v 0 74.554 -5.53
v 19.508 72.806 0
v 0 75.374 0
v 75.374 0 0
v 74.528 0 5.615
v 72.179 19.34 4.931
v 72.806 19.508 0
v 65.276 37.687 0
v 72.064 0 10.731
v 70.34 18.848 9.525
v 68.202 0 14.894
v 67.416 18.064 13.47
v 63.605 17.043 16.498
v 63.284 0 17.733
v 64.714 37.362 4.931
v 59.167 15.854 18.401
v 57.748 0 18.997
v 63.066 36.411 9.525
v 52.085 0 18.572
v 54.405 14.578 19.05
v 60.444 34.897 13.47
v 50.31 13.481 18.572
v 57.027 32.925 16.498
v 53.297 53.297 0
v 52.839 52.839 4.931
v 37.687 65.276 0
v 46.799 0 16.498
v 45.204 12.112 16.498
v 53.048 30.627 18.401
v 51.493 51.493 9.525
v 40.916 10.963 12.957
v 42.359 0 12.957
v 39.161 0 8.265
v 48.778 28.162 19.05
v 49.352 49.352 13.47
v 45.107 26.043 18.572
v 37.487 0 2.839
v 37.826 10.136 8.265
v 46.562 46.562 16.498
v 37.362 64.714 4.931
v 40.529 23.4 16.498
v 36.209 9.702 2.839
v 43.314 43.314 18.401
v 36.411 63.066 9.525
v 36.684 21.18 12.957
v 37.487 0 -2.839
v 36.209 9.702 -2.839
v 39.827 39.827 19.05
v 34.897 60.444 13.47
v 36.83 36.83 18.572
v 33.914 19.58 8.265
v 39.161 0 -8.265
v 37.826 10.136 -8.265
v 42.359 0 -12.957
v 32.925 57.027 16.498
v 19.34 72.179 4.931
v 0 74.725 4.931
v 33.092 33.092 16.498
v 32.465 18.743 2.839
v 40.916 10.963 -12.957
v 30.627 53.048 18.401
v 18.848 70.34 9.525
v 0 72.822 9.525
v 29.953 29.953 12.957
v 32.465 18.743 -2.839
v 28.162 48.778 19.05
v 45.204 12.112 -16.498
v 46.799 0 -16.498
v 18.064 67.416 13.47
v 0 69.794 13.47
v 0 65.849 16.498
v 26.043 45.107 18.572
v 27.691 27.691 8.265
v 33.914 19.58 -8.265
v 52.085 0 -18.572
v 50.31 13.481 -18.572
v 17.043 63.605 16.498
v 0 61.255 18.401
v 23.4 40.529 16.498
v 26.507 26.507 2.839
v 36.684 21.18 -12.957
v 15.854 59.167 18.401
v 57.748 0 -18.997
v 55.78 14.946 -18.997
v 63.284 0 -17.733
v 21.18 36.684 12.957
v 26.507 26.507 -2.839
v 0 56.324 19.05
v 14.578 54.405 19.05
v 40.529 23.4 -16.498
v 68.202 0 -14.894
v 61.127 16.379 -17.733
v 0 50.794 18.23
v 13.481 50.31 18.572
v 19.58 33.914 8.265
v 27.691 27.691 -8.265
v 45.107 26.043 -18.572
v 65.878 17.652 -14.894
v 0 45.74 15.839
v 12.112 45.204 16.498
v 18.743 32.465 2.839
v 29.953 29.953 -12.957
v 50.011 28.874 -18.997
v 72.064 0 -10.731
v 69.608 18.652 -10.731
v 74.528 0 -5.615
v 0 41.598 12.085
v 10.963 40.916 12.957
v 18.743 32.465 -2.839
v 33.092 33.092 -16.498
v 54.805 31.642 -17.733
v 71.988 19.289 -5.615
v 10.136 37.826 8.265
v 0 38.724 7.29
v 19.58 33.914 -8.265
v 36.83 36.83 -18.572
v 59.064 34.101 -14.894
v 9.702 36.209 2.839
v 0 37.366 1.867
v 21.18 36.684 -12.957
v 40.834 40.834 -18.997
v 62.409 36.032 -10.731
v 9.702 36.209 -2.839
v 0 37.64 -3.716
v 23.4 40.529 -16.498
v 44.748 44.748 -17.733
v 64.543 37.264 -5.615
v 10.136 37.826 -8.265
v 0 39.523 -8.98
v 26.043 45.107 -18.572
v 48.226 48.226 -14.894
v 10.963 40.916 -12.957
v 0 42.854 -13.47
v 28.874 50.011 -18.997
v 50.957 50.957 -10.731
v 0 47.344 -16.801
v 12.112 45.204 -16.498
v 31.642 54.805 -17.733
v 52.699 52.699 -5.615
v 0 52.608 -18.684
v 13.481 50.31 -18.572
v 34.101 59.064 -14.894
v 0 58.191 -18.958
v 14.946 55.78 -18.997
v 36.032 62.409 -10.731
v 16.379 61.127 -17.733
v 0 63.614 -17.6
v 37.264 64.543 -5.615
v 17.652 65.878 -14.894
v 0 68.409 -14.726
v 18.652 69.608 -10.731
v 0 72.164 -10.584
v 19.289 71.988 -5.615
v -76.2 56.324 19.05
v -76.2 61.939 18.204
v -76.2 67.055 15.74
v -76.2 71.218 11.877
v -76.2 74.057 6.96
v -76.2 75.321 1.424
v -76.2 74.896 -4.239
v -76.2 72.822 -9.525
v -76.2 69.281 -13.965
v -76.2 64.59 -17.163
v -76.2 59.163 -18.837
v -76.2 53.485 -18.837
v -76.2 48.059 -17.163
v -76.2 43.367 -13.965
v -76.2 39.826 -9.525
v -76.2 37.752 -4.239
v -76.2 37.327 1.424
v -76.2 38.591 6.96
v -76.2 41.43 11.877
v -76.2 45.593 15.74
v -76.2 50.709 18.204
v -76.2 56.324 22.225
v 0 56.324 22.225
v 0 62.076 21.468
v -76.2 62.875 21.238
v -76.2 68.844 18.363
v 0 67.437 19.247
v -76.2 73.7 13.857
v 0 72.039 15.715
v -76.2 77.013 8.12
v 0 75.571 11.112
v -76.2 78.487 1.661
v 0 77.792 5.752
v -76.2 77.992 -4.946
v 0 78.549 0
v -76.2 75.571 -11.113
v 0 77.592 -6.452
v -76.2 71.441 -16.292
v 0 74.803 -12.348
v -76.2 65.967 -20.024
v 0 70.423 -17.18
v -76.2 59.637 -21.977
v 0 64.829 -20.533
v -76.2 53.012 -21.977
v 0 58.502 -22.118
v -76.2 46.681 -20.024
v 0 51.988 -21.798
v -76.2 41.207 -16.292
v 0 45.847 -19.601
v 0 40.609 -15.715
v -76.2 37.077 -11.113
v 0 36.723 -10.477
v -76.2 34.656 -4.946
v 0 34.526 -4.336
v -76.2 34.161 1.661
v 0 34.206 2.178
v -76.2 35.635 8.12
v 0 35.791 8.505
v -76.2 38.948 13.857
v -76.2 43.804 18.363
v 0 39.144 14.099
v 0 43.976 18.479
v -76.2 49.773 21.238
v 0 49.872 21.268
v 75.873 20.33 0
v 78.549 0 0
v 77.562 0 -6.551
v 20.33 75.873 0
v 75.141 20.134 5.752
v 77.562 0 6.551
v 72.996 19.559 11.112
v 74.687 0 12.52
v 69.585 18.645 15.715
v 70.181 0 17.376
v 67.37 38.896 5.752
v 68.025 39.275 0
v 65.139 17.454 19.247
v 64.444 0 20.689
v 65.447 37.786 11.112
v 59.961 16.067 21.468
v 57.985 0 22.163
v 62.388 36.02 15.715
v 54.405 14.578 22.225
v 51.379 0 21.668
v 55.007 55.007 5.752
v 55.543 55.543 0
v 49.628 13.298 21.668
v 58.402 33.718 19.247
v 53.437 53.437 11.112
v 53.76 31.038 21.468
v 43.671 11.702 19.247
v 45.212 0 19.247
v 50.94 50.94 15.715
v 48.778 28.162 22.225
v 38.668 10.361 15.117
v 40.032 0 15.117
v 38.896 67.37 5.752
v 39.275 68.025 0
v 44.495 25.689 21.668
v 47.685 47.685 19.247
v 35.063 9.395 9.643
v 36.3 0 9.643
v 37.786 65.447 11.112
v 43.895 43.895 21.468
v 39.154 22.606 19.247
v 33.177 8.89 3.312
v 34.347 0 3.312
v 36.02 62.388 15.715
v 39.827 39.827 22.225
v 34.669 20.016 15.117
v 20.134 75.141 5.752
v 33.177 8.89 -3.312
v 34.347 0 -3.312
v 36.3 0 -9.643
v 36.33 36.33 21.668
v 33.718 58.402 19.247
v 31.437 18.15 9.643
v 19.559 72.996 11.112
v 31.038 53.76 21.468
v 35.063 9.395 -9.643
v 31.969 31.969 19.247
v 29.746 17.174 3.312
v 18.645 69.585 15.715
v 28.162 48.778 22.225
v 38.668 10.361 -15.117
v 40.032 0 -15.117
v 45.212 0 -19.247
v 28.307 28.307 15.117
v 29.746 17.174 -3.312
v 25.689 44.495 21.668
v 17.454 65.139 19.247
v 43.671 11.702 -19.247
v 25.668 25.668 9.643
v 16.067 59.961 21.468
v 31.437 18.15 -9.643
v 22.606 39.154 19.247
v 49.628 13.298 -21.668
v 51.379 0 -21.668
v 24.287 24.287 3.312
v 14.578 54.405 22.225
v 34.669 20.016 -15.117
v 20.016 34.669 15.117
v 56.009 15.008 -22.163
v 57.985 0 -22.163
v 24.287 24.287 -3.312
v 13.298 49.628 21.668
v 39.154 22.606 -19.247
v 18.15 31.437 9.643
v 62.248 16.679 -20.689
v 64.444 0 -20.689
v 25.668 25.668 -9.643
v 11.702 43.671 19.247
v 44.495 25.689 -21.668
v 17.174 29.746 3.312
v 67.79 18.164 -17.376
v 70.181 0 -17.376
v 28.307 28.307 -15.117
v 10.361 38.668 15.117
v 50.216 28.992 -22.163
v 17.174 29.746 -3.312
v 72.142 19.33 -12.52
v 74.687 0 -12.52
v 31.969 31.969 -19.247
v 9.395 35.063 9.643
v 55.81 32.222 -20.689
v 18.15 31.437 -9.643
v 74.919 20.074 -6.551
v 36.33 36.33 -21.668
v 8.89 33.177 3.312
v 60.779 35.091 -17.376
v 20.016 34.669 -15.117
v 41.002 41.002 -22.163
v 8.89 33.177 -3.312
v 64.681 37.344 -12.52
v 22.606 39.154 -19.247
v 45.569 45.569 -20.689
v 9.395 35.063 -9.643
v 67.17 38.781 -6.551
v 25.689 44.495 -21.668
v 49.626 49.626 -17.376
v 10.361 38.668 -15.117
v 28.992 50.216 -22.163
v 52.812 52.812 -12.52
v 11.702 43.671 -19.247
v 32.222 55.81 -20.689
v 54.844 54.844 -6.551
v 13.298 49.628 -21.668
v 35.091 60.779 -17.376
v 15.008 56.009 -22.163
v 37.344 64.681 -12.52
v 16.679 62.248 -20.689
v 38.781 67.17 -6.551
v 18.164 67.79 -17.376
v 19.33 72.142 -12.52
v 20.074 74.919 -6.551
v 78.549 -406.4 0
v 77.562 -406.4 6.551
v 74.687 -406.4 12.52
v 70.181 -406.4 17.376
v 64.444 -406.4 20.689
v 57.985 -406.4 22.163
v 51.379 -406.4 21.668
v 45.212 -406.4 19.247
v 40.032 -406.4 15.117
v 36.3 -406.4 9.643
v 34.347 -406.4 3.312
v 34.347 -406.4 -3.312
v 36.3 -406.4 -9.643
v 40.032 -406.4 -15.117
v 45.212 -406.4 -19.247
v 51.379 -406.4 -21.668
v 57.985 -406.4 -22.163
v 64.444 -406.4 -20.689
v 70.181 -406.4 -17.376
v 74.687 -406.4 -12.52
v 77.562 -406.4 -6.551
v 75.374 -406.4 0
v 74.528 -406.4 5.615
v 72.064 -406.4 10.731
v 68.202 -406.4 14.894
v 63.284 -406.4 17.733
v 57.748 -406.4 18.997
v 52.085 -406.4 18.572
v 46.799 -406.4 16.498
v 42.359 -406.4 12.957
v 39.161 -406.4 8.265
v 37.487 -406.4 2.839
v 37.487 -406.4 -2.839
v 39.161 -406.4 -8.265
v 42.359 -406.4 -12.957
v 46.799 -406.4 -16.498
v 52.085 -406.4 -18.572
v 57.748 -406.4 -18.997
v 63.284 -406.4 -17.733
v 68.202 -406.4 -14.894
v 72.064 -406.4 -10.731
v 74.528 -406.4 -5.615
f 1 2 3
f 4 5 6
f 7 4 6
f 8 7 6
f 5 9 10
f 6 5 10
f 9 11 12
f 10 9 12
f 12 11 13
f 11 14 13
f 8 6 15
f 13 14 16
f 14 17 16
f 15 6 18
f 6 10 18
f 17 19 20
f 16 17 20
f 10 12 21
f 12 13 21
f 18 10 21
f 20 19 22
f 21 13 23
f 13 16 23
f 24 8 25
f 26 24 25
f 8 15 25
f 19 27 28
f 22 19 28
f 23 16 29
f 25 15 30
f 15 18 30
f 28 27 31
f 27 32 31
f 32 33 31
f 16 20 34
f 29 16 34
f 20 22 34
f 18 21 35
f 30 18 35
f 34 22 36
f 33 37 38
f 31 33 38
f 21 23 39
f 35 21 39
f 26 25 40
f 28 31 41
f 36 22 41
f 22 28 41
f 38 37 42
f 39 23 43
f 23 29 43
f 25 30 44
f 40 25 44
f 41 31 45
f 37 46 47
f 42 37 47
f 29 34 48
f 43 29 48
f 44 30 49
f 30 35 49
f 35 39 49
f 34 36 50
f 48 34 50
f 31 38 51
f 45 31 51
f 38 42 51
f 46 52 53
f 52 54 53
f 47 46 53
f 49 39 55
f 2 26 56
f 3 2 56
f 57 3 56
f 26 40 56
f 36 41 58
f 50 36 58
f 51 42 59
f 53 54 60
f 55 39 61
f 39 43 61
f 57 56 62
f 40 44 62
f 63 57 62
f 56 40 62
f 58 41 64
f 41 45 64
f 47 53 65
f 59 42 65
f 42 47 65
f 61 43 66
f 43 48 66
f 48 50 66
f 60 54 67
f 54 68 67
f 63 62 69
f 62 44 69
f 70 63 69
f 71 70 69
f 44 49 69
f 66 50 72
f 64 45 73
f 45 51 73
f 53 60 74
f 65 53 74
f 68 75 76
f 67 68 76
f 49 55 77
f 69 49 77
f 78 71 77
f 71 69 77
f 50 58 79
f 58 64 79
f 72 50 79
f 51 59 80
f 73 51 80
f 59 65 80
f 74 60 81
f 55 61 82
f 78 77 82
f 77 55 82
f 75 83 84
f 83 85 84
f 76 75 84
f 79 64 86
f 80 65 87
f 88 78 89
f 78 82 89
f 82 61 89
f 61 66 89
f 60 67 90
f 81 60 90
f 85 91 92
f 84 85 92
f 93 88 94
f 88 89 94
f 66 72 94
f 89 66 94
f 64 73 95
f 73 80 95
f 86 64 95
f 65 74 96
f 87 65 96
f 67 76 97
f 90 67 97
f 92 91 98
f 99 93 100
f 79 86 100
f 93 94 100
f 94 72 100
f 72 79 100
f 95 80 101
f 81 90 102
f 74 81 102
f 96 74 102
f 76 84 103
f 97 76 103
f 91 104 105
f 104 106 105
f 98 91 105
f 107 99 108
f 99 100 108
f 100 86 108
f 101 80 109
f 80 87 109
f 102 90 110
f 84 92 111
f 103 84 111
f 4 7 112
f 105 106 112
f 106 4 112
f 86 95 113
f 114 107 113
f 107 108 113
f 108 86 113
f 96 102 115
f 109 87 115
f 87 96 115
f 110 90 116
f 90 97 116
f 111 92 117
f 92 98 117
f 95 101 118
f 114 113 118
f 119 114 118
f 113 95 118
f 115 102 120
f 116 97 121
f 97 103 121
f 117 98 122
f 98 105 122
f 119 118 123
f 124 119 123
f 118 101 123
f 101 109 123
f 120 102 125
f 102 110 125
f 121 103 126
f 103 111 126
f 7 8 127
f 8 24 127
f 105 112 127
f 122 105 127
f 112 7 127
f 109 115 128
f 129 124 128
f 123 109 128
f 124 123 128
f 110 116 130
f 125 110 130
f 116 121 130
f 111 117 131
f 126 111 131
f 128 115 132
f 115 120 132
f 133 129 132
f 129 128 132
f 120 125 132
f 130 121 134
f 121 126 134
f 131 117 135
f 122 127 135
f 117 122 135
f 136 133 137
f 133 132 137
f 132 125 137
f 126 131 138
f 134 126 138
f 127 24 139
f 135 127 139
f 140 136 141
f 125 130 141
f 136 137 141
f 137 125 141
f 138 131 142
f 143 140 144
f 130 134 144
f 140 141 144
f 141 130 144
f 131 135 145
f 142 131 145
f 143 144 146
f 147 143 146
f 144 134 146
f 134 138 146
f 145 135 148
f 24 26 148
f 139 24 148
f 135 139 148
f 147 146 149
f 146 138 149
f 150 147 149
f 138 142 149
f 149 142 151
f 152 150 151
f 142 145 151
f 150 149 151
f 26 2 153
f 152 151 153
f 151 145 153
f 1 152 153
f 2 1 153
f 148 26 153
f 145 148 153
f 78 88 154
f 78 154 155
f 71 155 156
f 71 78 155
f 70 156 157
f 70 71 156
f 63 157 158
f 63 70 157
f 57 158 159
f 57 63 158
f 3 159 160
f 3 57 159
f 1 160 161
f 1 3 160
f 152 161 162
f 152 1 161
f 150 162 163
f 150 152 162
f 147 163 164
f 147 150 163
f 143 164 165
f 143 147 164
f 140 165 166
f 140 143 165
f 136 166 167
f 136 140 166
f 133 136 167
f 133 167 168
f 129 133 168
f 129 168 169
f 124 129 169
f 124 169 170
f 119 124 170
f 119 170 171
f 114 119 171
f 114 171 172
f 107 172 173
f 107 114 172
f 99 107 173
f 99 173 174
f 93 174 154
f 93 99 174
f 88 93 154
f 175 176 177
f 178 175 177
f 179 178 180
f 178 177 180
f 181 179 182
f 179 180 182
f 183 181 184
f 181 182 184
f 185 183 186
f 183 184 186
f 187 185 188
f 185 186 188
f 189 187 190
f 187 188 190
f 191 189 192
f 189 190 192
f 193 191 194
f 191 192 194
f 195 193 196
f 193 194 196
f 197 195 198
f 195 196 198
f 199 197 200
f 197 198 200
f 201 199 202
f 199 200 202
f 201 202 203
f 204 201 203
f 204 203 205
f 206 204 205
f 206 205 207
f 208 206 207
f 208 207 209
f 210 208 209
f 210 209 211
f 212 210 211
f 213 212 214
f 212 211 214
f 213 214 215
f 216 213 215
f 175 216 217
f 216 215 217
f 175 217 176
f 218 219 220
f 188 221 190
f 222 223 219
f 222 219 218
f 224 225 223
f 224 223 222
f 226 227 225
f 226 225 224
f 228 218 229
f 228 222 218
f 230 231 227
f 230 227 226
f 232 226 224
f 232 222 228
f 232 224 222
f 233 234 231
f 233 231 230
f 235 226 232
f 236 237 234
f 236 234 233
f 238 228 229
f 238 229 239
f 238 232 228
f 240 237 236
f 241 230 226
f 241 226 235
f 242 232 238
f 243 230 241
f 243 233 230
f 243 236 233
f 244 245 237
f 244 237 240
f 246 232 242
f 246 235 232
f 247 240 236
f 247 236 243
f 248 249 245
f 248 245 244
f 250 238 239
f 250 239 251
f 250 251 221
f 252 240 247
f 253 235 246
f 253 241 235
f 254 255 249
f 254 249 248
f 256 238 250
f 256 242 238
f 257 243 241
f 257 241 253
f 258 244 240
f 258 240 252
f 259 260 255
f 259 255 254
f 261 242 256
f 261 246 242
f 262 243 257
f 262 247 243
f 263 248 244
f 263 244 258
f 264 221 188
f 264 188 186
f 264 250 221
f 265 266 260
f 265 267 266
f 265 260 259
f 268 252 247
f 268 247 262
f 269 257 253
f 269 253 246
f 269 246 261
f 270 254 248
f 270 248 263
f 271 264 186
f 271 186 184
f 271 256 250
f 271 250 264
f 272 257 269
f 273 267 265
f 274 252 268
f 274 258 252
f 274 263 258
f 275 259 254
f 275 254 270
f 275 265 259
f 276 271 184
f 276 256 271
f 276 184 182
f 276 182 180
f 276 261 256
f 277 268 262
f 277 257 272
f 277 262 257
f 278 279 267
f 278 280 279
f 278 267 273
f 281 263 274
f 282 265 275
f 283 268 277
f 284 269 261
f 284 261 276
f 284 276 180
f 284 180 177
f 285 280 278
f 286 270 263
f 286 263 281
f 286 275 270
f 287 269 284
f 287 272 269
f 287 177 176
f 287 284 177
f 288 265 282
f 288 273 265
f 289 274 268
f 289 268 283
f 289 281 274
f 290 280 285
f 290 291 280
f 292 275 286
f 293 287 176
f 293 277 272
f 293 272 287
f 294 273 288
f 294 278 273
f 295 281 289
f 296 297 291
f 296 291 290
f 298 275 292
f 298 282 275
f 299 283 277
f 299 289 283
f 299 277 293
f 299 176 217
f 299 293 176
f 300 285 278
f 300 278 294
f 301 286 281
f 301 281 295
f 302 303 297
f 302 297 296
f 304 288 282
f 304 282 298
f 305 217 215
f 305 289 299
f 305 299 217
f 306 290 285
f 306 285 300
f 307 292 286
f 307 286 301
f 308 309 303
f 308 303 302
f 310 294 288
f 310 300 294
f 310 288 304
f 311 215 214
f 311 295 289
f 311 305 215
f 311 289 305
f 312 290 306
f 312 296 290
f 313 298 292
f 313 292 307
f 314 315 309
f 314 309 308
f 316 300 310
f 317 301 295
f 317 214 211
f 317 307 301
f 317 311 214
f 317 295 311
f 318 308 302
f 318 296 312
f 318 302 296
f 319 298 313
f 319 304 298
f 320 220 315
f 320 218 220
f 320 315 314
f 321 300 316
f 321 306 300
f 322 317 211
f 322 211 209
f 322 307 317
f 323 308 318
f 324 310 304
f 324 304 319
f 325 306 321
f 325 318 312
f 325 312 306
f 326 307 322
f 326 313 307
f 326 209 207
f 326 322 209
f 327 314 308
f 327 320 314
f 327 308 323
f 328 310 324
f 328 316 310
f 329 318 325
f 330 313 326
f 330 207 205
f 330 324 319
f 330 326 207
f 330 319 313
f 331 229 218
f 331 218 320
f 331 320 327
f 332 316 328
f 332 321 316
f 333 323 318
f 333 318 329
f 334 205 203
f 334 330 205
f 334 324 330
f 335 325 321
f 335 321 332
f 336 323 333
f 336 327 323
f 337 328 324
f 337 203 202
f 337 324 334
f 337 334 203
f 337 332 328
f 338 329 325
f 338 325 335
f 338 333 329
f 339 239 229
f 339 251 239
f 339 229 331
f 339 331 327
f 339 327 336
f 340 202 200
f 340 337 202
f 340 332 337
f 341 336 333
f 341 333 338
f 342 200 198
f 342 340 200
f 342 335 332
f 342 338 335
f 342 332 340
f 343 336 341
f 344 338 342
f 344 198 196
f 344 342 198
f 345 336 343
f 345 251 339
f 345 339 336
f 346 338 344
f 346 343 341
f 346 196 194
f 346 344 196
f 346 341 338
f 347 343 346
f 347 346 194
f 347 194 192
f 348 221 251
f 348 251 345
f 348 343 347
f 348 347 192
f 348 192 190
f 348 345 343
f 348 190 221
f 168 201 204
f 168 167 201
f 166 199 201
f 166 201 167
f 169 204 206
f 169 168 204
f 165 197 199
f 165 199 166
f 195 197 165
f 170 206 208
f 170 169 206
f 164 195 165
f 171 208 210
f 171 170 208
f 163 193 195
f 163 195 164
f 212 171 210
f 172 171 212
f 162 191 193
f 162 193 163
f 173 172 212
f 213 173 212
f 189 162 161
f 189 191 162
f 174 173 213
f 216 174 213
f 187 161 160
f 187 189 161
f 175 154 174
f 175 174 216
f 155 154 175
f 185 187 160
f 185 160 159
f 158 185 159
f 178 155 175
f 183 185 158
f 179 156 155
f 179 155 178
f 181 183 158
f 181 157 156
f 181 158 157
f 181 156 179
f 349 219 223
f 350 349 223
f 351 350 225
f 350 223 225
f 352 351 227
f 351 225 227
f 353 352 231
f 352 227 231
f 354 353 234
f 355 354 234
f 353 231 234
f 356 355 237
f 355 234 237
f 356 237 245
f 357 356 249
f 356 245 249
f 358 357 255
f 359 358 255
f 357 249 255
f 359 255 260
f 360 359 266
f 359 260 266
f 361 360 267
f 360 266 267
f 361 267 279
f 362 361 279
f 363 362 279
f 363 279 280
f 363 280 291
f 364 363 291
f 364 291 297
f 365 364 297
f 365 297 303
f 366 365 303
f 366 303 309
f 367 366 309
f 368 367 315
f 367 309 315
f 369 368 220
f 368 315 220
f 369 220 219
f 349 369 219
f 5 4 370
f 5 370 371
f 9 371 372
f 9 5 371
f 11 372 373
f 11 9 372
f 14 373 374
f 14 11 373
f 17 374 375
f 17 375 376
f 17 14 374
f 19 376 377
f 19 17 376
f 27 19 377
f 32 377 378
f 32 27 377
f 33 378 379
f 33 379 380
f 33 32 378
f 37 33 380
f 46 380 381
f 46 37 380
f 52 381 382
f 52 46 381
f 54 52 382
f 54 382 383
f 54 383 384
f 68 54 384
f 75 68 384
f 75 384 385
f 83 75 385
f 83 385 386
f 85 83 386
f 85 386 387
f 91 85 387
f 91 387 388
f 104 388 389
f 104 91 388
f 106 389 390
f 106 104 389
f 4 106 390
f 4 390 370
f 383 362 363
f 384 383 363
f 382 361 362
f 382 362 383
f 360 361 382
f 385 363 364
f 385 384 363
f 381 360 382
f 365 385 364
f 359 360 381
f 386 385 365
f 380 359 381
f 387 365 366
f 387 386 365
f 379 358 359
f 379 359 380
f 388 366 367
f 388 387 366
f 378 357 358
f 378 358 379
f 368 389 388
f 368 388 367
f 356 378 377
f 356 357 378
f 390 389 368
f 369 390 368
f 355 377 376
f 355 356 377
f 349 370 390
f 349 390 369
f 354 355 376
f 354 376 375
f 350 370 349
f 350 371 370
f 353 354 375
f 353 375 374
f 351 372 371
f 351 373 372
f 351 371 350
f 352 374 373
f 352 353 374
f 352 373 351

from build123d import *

# Parameters (mm, degrees)
SKETCH5_R           = 22.225
SKETCH5_R_2         = 19.05
SKETCH6_R           = 22.225
SKETCH6_R_2         = 19.05
BOSS_EXTRUDE1_DEPTH = 76.2
SKETCH7_R           = 22.225
SKETCH7_R_2         = 19.05
BOSS_EXTRUDE2_DEPTH = 406.4


with BuildPart() as part:
    # Sweep1: sweep along a path in Sketch4
    with BuildLine(Plane.XY) as sweep1_path:
        ThreePointArc((56.324038217, 0), (39.827109367, 39.827109367), (0, 56.324038217))
    # Sketch5 → Sweep1 (sweep)
    with BuildSketch(Plane(origin=(0, 0, 0), x_dir=(1, 0, 0), z_dir=(0, 1, 0))):
        with Locations((56.324038217, 0)):
            Circle(SKETCH5_R)
        with Locations((56.324038217, 0)):
            Circle(SKETCH5_R_2, mode=Mode.SUBTRACT)
    sweep(path=sweep1_path.line)

    # Sketch6 → Boss-Extrude1 (add)
    with BuildSketch(Plane.ZY):
        with Locations((0, 56.324038217)):
            Circle(SKETCH6_R)
        with Locations((0, 56.324038217)):
            Circle(SKETCH6_R_2, mode=Mode.SUBTRACT)
    extrude(amount=BOSS_EXTRUDE1_DEPTH)

    # Sketch7 → Boss-Extrude2 (add)
    with BuildSketch(Plane.XZ):
        with Locations((56.324038217, 0)):
            Circle(SKETCH7_R)
        with Locations((56.324038217, 0)):
            Circle(SKETCH7_R_2, mode=Mode.SUBTRACT)
    extrude(amount=BOSS_EXTRUDE2_DEPTH)


solid = part.part
